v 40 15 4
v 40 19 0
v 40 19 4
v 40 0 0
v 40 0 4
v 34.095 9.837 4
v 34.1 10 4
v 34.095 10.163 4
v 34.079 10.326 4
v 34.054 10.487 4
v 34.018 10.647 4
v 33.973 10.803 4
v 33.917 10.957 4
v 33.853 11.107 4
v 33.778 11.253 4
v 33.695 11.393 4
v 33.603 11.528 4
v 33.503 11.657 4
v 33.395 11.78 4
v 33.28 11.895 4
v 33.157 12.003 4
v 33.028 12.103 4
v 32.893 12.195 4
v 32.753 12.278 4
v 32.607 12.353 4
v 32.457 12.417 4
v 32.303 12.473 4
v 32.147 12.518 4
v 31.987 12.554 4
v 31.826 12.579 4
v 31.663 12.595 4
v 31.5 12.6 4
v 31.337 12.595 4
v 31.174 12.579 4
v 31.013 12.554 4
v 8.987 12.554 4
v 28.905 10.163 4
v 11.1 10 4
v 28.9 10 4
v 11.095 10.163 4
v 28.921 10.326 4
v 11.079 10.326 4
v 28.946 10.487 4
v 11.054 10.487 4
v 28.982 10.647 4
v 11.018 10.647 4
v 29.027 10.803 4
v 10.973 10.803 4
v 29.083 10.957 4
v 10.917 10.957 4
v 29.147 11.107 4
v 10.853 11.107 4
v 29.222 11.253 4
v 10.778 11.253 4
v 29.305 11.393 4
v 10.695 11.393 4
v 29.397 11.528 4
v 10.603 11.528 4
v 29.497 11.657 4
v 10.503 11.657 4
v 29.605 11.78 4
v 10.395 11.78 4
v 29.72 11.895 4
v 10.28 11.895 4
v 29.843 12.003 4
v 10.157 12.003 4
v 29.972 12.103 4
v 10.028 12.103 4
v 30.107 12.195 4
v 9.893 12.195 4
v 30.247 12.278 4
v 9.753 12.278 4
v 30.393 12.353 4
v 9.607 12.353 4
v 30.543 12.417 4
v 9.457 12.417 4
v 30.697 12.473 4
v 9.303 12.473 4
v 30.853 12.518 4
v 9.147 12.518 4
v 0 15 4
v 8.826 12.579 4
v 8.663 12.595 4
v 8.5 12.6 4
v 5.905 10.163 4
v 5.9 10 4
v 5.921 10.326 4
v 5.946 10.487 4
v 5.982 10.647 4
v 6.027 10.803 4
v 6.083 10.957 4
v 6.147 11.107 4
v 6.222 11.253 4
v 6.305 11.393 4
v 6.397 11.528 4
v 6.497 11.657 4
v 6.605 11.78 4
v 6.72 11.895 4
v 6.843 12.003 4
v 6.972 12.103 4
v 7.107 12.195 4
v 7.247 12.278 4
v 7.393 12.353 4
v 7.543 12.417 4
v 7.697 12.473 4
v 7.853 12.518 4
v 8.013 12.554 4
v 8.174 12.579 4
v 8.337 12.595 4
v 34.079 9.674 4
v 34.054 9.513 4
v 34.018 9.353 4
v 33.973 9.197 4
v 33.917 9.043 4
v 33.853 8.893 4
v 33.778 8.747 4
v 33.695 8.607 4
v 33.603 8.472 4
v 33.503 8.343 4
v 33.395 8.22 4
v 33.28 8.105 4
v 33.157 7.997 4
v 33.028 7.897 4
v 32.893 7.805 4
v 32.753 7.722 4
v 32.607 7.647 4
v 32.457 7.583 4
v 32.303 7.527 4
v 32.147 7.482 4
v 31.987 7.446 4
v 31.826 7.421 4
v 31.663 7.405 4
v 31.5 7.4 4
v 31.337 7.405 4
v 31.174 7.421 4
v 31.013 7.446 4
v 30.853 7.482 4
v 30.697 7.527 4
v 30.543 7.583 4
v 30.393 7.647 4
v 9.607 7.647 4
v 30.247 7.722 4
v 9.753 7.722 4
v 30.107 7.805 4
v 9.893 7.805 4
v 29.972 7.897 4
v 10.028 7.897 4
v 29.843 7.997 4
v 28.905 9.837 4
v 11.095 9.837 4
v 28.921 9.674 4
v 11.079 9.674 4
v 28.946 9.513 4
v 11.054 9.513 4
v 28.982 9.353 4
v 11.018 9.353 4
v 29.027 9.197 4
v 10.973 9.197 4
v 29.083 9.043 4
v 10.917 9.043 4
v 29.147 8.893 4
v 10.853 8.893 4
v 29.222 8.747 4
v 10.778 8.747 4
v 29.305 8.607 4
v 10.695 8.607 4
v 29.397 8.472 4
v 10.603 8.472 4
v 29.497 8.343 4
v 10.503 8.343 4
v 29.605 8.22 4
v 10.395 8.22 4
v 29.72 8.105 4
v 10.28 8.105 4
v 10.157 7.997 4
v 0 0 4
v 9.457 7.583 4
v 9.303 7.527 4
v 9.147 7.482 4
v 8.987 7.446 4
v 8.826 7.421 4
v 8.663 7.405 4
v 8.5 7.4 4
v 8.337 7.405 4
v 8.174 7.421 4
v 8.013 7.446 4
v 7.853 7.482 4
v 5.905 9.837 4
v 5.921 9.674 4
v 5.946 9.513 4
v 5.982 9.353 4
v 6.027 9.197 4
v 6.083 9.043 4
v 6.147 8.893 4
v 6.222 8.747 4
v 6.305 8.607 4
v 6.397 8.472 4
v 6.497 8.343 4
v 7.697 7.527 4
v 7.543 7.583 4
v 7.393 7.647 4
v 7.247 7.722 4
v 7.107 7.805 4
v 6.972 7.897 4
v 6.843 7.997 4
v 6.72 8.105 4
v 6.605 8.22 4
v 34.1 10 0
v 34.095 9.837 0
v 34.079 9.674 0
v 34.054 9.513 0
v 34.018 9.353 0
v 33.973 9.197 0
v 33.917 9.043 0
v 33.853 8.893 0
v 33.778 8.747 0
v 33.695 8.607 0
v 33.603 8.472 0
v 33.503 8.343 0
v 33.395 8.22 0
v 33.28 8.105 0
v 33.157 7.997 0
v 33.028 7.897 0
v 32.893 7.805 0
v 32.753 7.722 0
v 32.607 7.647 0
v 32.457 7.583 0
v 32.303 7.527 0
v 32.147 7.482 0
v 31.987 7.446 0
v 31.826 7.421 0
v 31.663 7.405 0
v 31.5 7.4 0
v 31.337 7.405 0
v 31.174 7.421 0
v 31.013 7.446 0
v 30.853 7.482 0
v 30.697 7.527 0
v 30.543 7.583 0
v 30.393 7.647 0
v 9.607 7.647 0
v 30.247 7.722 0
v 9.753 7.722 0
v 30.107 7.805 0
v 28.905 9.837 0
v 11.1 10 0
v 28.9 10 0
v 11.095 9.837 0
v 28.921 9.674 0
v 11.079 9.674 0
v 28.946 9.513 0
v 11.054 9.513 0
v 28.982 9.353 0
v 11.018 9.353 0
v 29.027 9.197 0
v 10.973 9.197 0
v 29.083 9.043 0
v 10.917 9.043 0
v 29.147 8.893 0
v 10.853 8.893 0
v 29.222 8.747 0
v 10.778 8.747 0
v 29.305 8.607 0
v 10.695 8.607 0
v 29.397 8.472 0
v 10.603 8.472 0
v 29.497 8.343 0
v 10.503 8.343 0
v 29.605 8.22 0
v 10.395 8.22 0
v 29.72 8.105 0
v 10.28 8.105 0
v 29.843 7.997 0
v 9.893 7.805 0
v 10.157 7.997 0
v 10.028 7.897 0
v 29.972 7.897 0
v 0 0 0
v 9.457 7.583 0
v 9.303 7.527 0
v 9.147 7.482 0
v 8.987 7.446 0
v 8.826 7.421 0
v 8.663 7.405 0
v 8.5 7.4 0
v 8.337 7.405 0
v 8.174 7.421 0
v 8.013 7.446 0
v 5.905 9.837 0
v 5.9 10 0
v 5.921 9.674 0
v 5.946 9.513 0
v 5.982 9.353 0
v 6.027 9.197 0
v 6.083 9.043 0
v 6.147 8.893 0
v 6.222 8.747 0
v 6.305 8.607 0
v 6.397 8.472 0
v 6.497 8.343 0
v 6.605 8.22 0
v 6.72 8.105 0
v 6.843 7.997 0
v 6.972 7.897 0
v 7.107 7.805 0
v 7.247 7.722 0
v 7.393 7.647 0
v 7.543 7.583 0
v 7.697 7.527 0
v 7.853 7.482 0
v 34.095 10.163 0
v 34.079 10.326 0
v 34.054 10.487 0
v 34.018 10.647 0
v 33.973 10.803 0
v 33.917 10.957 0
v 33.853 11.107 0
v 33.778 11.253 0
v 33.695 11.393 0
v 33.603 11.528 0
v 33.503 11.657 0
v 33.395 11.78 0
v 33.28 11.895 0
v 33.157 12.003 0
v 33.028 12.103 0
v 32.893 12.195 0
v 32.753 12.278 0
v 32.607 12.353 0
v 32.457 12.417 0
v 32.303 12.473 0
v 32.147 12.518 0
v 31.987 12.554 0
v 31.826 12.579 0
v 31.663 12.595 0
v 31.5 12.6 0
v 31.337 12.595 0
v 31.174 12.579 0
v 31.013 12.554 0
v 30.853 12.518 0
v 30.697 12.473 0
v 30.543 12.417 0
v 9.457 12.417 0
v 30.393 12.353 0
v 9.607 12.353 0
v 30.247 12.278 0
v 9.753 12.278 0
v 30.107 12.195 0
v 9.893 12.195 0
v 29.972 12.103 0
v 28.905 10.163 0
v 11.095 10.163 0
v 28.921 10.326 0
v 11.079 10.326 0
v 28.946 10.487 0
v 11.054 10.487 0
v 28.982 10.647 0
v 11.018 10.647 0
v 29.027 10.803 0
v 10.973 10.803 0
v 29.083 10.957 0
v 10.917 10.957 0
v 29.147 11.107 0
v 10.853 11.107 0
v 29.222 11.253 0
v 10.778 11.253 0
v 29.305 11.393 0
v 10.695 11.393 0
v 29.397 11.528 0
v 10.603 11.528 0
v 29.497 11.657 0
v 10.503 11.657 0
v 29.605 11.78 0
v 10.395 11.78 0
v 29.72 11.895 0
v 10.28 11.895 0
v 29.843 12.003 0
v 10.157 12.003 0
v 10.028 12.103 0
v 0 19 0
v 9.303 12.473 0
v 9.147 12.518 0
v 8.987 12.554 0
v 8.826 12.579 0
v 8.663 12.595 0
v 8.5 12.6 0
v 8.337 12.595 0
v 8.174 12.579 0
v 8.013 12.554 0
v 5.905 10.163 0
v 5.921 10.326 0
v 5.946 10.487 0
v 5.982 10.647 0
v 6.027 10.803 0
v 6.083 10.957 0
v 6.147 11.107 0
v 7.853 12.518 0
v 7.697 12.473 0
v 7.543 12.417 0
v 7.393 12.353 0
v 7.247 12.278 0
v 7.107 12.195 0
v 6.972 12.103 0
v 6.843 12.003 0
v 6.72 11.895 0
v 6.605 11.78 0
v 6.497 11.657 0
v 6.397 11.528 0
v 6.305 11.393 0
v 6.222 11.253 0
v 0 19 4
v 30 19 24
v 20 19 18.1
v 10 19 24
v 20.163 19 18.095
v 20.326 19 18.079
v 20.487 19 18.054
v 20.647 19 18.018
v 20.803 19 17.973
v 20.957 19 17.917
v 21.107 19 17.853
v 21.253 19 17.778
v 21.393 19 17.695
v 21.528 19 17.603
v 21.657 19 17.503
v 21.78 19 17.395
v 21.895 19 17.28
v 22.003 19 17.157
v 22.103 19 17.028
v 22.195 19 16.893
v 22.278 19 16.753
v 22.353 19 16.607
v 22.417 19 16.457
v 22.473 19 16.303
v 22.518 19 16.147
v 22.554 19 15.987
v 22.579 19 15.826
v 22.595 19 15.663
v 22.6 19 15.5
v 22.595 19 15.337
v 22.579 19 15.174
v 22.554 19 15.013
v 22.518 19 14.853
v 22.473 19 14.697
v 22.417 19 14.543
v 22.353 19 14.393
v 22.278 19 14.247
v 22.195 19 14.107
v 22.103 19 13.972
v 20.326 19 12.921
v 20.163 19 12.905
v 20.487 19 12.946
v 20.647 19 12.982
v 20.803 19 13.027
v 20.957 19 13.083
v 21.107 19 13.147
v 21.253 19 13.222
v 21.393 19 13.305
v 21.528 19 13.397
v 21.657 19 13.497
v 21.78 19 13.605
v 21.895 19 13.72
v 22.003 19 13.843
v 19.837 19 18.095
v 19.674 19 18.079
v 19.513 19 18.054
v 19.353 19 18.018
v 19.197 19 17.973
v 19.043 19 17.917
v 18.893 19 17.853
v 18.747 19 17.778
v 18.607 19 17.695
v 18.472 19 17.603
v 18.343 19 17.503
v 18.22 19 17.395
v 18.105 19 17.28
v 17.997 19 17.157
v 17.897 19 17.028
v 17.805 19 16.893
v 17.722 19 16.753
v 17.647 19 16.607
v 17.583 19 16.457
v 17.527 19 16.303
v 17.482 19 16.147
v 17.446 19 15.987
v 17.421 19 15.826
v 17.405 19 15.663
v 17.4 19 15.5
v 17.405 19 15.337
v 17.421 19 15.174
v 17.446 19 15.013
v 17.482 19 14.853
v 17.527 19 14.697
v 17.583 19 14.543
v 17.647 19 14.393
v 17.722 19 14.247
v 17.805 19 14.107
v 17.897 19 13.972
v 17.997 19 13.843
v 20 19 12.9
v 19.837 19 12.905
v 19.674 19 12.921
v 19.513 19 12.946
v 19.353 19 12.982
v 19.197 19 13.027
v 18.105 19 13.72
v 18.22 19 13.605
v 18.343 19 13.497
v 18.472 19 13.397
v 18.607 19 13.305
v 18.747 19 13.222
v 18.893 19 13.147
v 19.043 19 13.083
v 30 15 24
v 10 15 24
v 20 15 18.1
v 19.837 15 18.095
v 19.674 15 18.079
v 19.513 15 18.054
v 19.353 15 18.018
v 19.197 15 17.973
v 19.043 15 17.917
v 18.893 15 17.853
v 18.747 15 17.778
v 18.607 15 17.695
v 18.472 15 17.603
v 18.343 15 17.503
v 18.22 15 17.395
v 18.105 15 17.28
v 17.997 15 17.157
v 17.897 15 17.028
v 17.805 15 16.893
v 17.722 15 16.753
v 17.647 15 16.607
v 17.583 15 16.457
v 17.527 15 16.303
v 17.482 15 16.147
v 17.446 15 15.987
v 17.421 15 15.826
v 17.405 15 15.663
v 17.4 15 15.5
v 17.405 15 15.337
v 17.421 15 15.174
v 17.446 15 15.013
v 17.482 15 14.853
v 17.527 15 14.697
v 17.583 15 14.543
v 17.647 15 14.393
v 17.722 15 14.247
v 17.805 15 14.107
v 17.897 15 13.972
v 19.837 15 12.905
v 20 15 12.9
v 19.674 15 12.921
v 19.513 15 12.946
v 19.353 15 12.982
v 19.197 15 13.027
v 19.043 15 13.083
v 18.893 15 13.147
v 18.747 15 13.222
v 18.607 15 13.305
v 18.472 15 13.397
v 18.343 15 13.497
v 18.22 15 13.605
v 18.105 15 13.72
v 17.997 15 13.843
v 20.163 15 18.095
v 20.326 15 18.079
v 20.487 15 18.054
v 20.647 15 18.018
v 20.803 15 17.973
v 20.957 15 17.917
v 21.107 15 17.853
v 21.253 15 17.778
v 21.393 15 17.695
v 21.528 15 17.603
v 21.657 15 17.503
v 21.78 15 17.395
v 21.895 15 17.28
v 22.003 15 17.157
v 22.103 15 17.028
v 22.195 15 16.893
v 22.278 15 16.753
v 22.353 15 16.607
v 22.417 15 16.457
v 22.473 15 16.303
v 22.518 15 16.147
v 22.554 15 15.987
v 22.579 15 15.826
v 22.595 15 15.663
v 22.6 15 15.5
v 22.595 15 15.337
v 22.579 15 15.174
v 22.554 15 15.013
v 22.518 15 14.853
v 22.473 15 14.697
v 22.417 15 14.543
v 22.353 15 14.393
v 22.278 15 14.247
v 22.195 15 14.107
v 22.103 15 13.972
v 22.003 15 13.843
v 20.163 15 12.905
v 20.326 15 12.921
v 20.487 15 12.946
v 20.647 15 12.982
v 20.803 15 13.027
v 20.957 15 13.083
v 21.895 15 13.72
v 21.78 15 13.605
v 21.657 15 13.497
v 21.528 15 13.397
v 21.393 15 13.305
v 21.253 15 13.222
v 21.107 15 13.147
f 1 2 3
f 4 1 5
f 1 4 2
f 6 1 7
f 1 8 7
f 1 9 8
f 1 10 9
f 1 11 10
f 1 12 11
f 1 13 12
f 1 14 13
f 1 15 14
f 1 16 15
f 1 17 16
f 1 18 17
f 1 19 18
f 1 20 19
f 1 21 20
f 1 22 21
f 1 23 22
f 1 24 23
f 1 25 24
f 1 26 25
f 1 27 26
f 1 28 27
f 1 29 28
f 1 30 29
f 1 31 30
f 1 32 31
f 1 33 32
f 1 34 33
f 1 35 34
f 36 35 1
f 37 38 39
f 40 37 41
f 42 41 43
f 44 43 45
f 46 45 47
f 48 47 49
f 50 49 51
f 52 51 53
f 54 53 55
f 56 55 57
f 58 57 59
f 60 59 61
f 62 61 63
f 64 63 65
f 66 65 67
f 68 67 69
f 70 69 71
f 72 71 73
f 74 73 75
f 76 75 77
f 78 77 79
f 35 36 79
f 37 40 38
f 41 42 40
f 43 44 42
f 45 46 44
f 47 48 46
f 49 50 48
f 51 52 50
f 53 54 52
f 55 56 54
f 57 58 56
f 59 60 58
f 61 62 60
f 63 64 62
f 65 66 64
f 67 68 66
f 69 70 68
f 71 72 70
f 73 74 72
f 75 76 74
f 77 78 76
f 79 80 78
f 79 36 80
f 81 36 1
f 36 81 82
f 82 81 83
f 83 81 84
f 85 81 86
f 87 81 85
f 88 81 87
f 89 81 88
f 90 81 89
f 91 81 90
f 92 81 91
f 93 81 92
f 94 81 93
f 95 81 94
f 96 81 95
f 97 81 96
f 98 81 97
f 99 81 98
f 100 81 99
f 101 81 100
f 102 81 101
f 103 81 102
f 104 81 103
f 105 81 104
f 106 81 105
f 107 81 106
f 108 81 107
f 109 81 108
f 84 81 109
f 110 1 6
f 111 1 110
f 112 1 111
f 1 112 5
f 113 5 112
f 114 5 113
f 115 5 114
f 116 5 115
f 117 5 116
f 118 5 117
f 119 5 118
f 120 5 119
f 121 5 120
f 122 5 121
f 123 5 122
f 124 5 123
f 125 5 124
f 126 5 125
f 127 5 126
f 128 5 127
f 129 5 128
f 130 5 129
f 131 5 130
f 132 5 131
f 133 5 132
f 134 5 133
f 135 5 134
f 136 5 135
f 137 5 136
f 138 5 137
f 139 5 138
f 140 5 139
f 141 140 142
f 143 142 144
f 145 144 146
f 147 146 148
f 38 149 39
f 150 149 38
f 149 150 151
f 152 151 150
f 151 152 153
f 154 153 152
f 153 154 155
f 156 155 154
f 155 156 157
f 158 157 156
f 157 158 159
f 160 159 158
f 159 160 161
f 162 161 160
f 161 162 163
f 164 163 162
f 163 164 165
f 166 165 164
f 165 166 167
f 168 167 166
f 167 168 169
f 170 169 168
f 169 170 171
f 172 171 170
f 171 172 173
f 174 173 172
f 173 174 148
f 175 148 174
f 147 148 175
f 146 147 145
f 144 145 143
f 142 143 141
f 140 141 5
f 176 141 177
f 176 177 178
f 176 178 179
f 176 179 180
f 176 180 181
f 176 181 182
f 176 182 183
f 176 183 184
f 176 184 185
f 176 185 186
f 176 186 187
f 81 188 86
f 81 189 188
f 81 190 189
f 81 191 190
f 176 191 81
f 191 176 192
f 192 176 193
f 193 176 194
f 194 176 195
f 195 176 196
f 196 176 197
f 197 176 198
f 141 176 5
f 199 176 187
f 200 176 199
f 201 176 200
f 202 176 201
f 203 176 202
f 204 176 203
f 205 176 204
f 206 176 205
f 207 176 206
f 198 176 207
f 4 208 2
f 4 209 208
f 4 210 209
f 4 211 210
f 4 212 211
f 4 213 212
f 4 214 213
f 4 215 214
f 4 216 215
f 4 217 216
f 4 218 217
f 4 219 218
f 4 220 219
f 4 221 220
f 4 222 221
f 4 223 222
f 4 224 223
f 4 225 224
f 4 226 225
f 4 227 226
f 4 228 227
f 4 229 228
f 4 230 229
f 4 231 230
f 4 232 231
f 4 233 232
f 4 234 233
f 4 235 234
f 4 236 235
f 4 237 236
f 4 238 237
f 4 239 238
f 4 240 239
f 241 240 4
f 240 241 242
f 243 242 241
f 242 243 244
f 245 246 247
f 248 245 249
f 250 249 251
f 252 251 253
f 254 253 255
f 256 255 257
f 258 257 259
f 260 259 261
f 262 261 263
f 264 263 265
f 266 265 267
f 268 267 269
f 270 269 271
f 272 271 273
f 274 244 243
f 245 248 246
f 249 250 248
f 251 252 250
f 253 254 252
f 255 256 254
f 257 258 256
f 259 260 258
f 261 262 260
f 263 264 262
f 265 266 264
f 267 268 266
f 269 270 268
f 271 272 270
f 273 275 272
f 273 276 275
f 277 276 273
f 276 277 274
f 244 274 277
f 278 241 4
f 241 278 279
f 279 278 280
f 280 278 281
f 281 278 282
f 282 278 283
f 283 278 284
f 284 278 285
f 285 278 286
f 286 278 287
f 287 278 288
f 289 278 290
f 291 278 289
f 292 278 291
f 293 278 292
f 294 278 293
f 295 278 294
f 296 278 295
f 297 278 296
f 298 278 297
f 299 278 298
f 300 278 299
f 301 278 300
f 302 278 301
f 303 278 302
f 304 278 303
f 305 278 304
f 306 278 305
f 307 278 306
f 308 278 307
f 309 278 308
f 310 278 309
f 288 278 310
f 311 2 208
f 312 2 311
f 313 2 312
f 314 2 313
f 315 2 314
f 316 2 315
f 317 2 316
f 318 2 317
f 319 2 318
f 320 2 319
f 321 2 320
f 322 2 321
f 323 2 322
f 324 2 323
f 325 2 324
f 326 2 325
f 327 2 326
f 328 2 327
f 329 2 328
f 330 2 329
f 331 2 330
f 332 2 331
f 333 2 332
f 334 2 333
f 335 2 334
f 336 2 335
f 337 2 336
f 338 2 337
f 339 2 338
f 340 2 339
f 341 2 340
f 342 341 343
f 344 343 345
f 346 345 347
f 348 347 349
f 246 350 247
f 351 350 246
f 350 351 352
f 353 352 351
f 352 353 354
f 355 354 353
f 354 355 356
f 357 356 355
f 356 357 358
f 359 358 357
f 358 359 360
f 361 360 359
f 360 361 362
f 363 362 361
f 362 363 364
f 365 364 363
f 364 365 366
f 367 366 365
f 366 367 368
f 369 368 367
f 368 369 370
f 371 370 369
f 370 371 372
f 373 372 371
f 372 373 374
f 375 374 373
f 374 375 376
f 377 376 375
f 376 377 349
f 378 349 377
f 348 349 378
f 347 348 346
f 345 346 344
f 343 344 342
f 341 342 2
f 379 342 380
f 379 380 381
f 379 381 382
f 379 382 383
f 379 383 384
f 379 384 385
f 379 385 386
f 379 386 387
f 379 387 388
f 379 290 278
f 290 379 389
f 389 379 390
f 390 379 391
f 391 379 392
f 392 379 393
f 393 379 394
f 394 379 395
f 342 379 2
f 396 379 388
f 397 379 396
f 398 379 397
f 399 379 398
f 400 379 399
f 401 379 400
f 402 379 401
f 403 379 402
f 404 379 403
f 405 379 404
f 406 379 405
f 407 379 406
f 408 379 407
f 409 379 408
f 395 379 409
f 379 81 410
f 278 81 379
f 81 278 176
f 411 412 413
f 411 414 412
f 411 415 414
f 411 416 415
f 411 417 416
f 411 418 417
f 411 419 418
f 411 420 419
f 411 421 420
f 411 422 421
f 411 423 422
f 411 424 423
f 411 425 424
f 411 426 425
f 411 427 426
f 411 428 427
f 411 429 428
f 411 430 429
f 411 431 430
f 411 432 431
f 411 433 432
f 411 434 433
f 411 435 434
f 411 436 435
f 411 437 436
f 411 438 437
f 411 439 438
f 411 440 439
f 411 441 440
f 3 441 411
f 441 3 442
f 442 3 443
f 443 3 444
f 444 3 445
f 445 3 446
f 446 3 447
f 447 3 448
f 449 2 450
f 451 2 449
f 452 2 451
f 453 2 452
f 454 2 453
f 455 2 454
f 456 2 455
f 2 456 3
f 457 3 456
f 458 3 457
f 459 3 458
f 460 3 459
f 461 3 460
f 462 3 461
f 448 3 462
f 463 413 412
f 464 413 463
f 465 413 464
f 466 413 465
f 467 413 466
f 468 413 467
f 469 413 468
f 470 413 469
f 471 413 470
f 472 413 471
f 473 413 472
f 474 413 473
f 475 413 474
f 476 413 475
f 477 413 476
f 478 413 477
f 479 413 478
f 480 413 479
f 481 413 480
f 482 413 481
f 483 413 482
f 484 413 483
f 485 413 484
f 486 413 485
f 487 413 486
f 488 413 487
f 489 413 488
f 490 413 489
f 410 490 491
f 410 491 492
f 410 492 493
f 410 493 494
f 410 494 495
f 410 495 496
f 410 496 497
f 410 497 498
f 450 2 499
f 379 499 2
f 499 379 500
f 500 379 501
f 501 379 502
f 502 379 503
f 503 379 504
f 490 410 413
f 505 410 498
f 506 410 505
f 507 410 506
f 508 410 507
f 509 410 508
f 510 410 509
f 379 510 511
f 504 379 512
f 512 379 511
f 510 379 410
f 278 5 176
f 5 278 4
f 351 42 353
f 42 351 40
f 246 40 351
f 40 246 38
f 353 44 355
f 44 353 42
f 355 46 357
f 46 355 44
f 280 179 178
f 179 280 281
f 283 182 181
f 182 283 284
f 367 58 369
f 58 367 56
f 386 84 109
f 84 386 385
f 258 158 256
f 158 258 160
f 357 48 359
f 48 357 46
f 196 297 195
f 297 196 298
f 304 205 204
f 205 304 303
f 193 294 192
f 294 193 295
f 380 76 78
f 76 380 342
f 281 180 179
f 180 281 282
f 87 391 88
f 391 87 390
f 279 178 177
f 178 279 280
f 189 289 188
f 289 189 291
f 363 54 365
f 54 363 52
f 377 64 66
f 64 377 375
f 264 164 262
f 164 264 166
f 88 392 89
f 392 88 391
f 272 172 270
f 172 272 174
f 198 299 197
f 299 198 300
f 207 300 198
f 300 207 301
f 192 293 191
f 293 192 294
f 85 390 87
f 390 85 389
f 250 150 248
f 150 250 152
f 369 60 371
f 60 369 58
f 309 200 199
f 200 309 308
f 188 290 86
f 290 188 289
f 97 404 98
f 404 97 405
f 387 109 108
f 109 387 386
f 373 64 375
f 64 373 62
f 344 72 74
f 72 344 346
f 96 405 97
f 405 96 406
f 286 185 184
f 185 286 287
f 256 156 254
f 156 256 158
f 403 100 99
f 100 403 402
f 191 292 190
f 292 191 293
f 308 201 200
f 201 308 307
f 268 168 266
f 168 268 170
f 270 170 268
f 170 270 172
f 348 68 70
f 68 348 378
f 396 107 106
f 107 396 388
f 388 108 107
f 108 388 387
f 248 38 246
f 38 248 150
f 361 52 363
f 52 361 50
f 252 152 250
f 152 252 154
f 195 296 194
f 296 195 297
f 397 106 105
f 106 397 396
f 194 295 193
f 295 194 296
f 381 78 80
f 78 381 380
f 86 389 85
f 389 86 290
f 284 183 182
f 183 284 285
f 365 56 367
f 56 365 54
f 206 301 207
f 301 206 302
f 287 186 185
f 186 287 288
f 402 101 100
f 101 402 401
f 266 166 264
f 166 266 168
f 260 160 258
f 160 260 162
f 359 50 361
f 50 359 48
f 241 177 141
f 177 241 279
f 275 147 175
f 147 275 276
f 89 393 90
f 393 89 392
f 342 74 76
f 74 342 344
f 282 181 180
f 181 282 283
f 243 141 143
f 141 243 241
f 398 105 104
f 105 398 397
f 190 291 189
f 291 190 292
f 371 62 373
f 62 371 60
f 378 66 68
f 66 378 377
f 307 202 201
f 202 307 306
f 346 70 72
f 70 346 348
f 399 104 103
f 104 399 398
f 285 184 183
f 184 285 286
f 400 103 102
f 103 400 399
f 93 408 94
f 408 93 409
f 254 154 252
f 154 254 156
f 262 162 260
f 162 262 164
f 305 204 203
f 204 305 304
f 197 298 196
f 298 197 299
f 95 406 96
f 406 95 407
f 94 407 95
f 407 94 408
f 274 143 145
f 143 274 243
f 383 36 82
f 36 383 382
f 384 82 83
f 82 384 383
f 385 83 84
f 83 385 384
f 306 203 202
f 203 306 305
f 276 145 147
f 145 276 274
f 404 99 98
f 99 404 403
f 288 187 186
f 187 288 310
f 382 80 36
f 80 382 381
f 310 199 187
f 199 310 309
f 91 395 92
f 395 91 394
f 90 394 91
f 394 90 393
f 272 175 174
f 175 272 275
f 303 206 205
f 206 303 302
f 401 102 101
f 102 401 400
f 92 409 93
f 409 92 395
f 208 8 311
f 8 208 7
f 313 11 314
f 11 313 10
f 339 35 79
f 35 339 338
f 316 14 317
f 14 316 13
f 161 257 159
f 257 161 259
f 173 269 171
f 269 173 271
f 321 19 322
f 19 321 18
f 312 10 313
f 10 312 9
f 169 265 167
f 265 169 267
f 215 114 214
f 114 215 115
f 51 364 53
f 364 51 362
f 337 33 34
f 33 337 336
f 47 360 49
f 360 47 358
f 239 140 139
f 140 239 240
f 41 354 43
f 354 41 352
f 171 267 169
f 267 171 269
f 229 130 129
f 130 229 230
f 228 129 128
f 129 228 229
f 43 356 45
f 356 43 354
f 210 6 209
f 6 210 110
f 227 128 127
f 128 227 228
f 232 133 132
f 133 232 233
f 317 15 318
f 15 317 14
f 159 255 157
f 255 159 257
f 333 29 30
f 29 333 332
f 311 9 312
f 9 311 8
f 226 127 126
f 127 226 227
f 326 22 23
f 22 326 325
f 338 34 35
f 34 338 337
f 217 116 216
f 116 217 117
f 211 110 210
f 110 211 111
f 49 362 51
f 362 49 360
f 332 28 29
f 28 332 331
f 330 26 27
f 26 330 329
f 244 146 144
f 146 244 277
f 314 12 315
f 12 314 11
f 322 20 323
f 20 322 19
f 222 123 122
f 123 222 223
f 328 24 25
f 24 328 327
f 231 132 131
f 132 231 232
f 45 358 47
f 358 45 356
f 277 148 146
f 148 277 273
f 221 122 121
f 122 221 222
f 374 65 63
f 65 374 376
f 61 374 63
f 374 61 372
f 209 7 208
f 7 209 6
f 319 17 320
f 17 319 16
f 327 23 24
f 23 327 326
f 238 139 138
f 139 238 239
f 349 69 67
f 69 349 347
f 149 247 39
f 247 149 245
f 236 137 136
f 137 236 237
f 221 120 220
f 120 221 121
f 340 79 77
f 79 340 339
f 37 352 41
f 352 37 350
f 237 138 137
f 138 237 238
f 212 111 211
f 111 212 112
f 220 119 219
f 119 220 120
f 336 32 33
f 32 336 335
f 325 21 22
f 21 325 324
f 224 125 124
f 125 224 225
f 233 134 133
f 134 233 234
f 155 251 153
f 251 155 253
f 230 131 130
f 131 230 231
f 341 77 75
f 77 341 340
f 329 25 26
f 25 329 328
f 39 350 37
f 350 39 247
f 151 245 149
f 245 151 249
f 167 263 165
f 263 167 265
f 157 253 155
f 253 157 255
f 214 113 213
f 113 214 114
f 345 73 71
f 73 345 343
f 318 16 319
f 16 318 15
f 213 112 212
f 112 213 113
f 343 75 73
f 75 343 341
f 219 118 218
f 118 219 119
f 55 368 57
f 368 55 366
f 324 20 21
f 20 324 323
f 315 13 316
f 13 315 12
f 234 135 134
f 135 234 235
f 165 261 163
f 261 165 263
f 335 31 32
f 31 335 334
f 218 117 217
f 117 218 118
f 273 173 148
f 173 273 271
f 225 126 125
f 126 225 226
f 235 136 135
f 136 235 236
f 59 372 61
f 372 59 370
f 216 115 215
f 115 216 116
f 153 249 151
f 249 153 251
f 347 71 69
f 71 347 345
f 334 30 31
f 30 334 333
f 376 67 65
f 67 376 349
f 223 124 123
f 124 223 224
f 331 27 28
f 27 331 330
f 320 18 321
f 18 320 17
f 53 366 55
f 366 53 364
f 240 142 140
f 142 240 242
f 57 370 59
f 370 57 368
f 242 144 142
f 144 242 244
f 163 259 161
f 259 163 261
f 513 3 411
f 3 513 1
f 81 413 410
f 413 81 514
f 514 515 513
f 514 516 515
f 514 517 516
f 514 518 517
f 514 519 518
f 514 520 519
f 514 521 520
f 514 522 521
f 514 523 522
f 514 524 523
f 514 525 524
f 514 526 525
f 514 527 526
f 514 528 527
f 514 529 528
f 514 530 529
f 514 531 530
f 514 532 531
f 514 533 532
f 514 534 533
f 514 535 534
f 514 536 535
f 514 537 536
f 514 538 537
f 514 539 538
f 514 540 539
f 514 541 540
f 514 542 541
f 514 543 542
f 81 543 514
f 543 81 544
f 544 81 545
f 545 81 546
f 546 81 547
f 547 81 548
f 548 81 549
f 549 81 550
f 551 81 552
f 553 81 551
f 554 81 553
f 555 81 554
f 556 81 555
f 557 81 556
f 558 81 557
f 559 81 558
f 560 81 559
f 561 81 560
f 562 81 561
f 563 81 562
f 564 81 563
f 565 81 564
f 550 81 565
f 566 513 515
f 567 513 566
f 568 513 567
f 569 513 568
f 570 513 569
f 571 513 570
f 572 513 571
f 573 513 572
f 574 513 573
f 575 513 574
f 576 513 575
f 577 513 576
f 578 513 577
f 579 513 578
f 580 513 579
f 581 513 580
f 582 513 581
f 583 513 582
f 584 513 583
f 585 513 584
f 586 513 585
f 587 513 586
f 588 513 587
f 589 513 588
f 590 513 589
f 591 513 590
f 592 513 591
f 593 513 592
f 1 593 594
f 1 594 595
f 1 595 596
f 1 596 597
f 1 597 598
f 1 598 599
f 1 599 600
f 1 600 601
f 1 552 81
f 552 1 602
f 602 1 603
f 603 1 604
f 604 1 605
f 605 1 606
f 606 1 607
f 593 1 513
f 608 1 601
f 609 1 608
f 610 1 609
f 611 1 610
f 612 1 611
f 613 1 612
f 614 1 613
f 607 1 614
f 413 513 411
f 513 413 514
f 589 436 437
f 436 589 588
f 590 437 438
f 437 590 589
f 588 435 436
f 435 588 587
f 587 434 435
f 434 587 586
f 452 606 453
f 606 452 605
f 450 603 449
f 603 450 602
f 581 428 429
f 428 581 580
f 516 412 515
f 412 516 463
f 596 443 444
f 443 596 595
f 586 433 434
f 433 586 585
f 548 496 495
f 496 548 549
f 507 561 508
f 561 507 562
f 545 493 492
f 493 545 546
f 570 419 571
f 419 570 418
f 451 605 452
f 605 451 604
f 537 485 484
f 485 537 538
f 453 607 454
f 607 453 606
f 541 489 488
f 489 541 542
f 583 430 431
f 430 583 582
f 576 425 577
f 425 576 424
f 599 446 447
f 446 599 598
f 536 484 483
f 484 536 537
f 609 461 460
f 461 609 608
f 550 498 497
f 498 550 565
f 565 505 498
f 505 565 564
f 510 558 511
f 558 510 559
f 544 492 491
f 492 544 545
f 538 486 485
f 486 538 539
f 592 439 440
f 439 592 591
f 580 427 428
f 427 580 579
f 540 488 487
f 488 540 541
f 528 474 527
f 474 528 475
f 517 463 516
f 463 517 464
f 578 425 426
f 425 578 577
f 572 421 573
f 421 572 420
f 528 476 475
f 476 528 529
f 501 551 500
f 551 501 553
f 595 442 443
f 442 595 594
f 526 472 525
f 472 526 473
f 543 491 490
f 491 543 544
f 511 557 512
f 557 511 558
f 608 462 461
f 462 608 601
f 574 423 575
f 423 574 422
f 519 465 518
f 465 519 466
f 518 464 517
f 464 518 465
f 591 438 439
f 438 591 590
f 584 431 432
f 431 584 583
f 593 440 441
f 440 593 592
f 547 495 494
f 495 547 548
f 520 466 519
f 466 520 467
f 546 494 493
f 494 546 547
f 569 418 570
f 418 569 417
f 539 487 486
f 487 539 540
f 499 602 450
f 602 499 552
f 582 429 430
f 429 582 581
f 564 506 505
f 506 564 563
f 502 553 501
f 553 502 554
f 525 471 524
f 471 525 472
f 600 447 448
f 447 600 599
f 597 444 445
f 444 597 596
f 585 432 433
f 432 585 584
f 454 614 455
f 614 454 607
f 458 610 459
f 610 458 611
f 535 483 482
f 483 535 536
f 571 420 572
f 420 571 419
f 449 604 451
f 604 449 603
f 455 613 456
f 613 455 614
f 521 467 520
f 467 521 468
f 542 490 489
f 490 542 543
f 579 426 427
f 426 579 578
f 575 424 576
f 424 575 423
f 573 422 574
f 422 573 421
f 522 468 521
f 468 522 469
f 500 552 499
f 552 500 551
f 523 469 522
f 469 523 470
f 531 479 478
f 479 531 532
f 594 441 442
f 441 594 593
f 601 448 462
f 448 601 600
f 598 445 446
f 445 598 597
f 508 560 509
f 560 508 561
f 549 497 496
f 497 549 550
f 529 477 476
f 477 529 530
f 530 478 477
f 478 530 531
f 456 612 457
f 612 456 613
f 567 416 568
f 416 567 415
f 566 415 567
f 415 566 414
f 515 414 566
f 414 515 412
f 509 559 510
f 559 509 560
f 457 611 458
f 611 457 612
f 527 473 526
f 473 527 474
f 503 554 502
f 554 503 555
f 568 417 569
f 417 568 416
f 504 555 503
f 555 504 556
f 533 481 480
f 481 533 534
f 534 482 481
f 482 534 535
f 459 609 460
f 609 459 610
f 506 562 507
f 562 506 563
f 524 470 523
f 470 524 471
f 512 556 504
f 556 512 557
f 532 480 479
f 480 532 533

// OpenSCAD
// file: functions.scad
/**********************************
	File: functions.scad
	Revision: 0.1 (10/7/2012)
	OpenSCAD version by:
	Michael Williams (gannon)
	mswillia@mtu.edu
**********************************/
include <config.scad>

//Drill a hole the given depth at the given location
module drill(x,y,radius,depth) {
	translate([x,y,-overdrill])
		cylinder(r=radius,h=depth,$fn=100);
}

module roundedcorner(radius,thickness,angle) {
	rotate([0,0,angle])
		translate([-radius+overdrill,-radius+overdrill,-overdrill])
			difference() {
				translate([-overdrill,-overdrill,0])
					cube([radius+overdrill,radius+overdrill,thickness+overdrill*2]);
				cylinder(r=radius,h=thickness+overdrill*2);
			}
}

//Usage: points is an array consisting of elements
//[x,y,r] for each point of the polygon
//Please note that x and y will be the centers
//of the rounded edges! Outside wall will be
//r away at some angle.
//Ideally I will make a function that will find
//the place to put the circle of a given radius
//based off of the points in the polygon.
module multiradiusroundedpoly(points,height) {
	linear_extrude(height=height)
		hull()
			for (p = points) {
				translate([p[0],p[1],0])
					circle(r=p[2],$fn=100);
			}
}
// file: config.scad
/**********************************
	File: config.scad
	Revision: 0.1 (10/7/2012)
	OpenSCAD version by:
	Michael Williams (gannon)
	mswillia@mtu.edu
**********************************/

/**********************************
		CONFIGURATION
**********************************/
//This is for the depth of holes so OpenSCAD renders correctly.
overdrill=0.1;

//Eventually group configurations into here. Maybe auto config for metric vs SAE components?

/**********************************
		END CONFIGURATION
**********************************/
// main file
/**********************************
	File: Y_FrameConnector.scad
	Revision: 0.2 (10/7/2012)
	OpenSCAD version by:
	Michael Williams (gannon)
	mswillia@mtu.edu
**********************************/
include <config.scad>
use <functions.scad>
/**********************************
		CONFIGURATION
**********************************/
//Base size
width=40;
height=19;
thickness=4;

//Back size
t_width=20;
t_height=20;

//Holes
radius=2.6;

/**********************************
		END CONFIGURATION
**********************************/
union() {
	//Make our base unit
	difference() {
		cube([width,height,thickness]);

		//Drill the hole
		drill(8.5,10,radius,thickness+overdrill*2);
		drill(width-8.5,10,radius,thickness+overdrill*2);
	}

	//Back unit
	translate([0,height,thickness])
		rotate([90,0,0])
			difference() {
				linear_extrude(height=thickness)
					polygon(points=[[0,0],[((width-t_width)/2),t_height],[t_width+((width-t_width)/2),t_height],[width,0]]);
				drill(width/2,11.5,radius,thickness+overdrill*2);

			}
}
